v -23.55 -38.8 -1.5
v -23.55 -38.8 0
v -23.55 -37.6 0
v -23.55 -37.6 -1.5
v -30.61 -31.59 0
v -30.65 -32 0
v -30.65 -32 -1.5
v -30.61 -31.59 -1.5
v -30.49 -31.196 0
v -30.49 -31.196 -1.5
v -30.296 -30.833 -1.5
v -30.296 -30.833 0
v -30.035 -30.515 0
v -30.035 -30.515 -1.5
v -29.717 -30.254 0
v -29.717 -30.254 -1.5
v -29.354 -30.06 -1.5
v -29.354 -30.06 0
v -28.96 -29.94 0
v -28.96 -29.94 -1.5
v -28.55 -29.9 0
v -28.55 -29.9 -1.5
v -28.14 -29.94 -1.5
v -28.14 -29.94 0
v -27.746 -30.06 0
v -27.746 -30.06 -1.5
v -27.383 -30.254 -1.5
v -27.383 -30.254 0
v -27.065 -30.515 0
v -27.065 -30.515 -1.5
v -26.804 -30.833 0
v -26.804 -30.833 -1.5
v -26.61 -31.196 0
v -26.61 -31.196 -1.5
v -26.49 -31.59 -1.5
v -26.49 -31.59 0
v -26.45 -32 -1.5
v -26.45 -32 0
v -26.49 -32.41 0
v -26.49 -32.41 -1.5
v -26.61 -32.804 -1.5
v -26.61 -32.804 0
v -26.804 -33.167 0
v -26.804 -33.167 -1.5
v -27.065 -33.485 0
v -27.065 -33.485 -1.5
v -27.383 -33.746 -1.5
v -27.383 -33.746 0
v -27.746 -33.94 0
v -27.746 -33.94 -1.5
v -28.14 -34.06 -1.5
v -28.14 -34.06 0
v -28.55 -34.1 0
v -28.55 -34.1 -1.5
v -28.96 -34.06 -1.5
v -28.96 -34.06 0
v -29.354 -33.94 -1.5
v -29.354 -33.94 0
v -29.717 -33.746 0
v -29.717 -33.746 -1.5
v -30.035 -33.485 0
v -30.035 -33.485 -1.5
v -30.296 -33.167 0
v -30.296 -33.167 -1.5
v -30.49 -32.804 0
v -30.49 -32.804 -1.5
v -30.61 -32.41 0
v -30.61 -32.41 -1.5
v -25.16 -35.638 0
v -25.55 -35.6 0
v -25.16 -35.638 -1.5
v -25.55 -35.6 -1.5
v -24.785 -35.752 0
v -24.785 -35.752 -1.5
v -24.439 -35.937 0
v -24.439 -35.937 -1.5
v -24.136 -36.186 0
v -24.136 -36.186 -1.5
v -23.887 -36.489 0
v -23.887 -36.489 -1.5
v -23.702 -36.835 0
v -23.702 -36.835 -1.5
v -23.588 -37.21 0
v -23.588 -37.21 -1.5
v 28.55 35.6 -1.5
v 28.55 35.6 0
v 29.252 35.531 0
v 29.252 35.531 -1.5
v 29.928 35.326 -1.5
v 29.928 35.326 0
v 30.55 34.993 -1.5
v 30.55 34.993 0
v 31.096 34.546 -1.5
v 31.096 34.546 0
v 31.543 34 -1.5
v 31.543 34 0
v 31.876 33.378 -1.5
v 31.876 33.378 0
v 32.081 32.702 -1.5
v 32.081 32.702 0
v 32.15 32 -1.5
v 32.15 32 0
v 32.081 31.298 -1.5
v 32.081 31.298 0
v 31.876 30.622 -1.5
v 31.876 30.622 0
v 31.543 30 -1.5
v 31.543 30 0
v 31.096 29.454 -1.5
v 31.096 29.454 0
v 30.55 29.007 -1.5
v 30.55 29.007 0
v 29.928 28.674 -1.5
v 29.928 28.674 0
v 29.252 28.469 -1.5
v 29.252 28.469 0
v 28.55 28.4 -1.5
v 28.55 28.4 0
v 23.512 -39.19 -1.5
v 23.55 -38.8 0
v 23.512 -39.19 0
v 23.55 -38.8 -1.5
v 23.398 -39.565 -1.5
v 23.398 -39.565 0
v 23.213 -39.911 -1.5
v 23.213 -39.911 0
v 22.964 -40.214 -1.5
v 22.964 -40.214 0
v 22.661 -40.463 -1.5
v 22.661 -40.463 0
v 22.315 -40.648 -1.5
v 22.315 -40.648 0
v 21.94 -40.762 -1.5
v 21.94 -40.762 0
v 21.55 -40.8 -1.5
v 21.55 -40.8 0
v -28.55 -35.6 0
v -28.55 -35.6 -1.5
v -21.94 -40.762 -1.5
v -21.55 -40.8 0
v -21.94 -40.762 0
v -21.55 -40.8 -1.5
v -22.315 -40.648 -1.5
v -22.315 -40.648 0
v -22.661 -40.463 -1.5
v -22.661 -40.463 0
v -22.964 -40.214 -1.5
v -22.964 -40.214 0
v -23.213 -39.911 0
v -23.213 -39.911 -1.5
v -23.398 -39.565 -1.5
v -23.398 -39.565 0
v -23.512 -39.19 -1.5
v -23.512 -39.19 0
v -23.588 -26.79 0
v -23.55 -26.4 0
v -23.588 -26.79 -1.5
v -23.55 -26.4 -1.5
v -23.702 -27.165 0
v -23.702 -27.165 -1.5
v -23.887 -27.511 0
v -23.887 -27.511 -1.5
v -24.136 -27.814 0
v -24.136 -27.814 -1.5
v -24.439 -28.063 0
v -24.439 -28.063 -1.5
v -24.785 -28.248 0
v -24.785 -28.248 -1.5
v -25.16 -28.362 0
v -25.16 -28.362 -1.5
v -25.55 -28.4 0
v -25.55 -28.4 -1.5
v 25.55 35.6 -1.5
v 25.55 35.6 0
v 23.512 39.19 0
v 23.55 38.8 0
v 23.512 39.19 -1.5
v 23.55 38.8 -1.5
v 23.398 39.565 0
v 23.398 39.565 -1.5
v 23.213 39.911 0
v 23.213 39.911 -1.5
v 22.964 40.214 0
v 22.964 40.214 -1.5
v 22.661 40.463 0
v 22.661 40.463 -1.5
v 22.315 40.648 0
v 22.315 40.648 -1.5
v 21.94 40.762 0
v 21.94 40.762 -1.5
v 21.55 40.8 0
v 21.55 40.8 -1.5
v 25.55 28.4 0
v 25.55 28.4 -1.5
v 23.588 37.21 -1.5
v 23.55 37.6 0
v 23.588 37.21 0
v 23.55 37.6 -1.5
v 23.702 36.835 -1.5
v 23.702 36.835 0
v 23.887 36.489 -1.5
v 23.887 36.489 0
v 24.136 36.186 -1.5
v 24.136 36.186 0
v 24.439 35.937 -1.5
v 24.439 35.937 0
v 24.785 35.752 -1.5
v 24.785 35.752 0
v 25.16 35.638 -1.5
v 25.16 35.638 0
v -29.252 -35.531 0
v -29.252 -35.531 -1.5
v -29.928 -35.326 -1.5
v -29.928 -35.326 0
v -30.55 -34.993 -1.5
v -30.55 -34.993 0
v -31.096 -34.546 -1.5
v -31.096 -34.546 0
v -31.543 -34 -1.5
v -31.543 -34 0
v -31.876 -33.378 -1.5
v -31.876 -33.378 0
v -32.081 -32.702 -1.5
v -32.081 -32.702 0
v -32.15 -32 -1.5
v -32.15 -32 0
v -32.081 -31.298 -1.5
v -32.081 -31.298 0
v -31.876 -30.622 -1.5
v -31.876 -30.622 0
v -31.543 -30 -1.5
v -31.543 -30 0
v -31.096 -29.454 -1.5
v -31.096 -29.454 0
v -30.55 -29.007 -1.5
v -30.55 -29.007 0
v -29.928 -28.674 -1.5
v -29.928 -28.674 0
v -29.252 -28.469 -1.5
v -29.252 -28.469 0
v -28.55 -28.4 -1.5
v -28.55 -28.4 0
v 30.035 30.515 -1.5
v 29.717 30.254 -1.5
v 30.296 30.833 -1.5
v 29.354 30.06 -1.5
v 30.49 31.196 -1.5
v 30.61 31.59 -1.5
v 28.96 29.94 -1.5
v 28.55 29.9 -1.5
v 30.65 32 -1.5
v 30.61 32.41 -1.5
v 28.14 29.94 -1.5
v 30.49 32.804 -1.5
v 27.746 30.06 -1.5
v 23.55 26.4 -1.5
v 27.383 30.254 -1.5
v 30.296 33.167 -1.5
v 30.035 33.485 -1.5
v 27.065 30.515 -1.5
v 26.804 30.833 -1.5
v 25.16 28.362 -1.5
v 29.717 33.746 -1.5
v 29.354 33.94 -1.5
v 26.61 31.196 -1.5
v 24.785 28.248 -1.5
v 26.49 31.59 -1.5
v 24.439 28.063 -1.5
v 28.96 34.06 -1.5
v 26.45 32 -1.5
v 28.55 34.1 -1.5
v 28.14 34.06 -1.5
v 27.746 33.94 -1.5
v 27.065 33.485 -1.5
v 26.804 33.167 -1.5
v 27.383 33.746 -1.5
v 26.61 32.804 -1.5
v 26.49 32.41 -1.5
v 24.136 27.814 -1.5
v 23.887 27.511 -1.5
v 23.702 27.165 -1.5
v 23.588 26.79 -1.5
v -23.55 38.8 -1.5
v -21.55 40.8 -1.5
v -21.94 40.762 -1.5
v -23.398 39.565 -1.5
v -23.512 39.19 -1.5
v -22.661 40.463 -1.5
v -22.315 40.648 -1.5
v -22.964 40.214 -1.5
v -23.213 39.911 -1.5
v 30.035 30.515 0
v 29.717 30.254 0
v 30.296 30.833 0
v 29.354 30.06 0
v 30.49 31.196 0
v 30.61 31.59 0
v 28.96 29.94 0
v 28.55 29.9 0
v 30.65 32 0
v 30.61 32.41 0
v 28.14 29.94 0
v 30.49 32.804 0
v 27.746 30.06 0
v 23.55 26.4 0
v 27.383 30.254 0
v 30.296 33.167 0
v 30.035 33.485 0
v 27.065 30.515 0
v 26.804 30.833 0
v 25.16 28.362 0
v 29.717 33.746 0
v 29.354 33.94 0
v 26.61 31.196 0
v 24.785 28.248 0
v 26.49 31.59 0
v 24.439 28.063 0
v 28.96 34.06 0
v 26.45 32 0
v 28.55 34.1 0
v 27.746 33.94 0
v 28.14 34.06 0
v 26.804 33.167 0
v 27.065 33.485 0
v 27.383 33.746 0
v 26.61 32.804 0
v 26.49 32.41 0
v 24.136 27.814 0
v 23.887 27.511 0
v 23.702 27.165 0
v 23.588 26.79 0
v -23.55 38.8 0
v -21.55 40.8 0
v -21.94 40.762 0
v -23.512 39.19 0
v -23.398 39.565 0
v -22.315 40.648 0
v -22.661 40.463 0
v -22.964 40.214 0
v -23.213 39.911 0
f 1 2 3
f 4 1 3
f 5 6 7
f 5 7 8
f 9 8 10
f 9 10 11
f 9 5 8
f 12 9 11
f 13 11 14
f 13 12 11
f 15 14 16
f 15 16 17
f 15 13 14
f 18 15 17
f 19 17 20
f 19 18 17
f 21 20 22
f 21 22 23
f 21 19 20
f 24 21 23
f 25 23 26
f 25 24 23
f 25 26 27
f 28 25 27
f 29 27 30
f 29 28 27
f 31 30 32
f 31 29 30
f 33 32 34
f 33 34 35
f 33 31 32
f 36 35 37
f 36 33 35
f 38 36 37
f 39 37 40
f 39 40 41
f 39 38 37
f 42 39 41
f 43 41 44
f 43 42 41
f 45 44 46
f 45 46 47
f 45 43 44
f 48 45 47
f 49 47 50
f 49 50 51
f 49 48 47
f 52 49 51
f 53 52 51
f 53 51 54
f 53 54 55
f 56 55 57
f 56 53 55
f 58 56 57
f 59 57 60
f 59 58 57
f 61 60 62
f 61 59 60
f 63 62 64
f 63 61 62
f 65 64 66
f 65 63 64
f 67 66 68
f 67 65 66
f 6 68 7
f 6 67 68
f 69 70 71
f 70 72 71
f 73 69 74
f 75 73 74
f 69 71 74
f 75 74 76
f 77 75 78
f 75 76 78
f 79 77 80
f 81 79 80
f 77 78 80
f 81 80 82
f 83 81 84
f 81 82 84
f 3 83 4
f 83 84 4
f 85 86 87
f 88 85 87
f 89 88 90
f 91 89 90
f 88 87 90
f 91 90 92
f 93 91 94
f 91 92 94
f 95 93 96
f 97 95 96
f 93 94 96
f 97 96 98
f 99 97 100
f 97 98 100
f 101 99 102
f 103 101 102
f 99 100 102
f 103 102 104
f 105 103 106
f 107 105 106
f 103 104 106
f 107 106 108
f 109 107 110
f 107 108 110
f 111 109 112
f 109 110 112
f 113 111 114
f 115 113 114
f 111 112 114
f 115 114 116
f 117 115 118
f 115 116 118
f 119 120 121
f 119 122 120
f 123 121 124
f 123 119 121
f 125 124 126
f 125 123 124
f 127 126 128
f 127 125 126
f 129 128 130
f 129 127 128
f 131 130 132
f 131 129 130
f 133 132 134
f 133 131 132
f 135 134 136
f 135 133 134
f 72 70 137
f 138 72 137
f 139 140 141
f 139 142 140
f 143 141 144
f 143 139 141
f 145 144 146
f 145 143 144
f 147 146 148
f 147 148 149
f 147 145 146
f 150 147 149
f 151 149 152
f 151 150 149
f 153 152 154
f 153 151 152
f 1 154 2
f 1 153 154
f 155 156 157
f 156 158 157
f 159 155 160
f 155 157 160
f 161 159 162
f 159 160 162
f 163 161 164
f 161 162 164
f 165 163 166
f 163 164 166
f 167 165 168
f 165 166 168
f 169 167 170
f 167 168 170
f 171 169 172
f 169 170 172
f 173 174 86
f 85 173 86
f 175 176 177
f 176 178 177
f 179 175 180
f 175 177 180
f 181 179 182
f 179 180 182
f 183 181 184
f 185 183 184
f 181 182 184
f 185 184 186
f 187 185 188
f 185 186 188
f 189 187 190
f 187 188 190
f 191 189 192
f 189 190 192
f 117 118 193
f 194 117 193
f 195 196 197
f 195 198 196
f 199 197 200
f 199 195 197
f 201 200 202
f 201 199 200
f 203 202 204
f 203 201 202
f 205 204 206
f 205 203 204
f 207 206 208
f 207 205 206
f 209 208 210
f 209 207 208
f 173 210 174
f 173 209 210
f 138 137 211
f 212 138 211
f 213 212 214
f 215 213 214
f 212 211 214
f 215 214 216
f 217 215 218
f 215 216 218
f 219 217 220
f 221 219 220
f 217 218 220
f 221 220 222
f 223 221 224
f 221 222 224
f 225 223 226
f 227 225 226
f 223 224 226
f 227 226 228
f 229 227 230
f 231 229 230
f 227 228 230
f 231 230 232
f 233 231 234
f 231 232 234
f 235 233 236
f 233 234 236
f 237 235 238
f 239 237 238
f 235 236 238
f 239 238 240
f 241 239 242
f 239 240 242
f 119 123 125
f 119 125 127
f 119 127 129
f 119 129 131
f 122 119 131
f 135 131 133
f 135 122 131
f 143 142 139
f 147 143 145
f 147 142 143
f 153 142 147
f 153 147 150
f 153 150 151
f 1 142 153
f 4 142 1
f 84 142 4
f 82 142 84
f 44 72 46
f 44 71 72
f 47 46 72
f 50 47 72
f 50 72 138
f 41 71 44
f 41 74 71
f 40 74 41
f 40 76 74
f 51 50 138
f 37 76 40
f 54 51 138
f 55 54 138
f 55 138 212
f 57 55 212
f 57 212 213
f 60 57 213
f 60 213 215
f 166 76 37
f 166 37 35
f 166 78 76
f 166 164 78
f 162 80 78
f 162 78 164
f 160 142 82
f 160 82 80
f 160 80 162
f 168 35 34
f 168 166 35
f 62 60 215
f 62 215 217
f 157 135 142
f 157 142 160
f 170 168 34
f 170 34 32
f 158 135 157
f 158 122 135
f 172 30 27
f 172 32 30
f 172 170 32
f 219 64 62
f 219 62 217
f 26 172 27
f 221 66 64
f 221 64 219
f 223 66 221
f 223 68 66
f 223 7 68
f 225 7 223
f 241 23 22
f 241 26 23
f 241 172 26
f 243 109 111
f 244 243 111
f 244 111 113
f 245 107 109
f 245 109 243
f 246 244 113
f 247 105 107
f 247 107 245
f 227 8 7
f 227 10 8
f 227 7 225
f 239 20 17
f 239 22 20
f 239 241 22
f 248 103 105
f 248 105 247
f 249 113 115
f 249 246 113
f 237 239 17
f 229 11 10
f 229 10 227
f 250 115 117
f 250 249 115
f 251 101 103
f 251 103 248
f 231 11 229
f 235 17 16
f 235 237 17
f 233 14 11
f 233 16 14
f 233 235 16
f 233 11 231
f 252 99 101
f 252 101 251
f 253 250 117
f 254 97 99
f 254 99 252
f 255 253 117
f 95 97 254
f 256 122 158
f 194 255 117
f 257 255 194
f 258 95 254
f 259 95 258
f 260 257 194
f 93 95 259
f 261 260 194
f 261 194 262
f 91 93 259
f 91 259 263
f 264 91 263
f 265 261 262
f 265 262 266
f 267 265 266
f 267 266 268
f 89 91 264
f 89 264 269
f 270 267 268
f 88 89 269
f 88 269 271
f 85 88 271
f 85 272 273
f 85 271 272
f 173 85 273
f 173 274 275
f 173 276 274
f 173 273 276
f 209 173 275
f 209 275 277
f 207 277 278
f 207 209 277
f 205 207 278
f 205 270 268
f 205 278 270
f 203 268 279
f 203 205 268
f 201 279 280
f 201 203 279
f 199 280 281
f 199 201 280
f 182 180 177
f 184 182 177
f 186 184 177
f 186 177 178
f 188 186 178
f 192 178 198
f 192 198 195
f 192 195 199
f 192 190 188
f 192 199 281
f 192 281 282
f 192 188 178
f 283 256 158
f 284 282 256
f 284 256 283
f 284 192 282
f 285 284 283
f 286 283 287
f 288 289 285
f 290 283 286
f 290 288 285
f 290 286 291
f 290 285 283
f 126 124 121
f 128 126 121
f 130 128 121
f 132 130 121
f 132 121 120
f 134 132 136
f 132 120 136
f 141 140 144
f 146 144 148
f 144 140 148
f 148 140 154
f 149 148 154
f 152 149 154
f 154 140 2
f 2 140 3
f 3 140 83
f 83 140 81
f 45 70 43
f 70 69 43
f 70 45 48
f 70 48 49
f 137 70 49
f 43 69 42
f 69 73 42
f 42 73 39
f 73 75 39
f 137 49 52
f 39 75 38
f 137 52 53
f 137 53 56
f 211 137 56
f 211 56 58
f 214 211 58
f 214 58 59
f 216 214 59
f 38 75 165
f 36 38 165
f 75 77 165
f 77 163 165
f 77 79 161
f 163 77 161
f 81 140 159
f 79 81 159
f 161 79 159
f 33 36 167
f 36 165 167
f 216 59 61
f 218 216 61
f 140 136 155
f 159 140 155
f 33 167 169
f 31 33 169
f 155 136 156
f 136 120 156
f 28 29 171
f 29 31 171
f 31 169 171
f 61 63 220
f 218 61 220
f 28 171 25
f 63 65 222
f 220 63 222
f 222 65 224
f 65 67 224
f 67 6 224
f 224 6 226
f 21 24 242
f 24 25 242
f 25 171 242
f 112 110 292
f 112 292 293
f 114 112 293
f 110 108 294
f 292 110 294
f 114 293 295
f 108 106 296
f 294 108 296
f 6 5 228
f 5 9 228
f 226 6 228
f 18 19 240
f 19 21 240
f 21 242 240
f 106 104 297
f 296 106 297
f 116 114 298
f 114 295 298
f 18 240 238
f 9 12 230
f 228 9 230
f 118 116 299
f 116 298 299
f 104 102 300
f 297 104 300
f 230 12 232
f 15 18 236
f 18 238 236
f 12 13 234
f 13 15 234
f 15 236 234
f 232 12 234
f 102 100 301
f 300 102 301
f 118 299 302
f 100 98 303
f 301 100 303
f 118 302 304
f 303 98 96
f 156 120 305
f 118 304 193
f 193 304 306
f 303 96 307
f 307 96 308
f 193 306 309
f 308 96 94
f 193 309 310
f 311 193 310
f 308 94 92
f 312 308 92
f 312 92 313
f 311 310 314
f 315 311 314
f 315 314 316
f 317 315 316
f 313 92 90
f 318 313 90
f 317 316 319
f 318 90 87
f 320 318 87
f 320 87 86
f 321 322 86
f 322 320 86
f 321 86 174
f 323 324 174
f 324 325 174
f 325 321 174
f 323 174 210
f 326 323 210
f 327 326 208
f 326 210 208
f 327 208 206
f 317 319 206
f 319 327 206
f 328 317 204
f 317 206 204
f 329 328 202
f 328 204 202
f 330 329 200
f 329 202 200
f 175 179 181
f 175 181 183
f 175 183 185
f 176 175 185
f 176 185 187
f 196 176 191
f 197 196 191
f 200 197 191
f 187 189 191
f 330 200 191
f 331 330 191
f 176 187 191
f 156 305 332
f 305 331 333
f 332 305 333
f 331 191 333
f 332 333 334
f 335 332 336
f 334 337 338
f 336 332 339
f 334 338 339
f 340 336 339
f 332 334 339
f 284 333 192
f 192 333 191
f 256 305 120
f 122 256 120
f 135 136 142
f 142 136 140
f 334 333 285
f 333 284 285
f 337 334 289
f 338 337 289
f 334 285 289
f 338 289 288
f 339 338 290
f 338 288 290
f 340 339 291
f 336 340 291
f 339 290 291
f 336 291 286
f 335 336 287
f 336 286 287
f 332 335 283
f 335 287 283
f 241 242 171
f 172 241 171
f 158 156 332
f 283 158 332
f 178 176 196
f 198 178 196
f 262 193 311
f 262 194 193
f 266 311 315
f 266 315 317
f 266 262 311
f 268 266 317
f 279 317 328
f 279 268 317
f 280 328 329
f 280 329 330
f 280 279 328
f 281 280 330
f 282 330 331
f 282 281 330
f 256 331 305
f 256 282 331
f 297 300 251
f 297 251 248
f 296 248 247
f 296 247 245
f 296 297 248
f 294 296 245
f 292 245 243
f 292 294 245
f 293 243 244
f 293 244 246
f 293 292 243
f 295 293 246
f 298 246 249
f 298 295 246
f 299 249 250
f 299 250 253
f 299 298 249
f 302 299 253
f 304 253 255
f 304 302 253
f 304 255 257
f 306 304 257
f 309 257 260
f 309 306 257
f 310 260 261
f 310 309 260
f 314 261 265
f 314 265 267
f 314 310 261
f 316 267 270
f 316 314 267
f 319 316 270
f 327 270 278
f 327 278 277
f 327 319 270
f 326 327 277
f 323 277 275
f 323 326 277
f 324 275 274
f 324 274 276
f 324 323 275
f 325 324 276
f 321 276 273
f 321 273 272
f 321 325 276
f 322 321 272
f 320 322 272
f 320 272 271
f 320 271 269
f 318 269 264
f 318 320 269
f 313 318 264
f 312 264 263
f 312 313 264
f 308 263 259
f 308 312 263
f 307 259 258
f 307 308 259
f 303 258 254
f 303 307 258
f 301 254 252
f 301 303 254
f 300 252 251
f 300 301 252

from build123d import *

# Parameters (mm, degrees)
SKETCH1_R           = 2.1
BOSS_EXTRUDE1_DEPTH = 1.5
FILLET1_R           = 2


with BuildPart() as part:
    # Sketch1 → Boss-Extrude1 (new body)
    with BuildSketch(Plane(origin=(0, 0, 0), x_dir=(-1, 0, 0), z_dir=(0, 0, -1))):
        with BuildLine():
            Line((-23.55, 40.8), (-23.55, 35.6))
            Line((-23.55, 35.6), (-28.55, 35.6))
            ThreePointArc((-28.55, 35.6), (-32.15, 32), (-28.55, 28.4))
            Line((-28.55, 28.4), (-23.55, 28.4))
            Line((-23.55, 28.4), (-23.55, -40.8))
            Line((-23.55, -40.8), (23.55, -40.8))
            Line((23.55, -40.8), (23.55, -35.6))
            Line((23.55, -35.6), (28.55, -35.6))
            ThreePointArc((28.55, -35.6), (32.15, -32), (28.55, -28.4))
            Line((28.55, -28.4), (23.55, -28.4))
            Line((23.55, -28.4), (23.55, 40.8))
            Line((23.55, 40.8), (-23.55, 40.8))
        make_face()
        with Locations(Location((-28.55, 32, 0), (0, 0, 180))):
            Circle(SKETCH1_R, mode=Mode.SUBTRACT)
        with Locations((28.55, -32)):
            Circle(SKETCH1_R, mode=Mode.SUBTRACT)
    extrude(amount=BOSS_EXTRUDE1_DEPTH)

    # Fillet1
    fillet1_edges = [part.edges().sort_by_distance(p)[0] for p in [
        (23.55, 40.8, -0.75),
        (23.55, 35.6, -0.75),
        (23.55, 28.4, -0.75),
        (23.55, -40.8, -0.75),
        (-23.55, -40.8, -0.75),
        (-23.55, -35.6, -0.75),
        (-23.55, -28.4, -0.75),
        (-23.55, 40.8, -0.75),
    ]]
    fillet(fillet1_edges, radius=FILLET1_R)


solid = part.part
